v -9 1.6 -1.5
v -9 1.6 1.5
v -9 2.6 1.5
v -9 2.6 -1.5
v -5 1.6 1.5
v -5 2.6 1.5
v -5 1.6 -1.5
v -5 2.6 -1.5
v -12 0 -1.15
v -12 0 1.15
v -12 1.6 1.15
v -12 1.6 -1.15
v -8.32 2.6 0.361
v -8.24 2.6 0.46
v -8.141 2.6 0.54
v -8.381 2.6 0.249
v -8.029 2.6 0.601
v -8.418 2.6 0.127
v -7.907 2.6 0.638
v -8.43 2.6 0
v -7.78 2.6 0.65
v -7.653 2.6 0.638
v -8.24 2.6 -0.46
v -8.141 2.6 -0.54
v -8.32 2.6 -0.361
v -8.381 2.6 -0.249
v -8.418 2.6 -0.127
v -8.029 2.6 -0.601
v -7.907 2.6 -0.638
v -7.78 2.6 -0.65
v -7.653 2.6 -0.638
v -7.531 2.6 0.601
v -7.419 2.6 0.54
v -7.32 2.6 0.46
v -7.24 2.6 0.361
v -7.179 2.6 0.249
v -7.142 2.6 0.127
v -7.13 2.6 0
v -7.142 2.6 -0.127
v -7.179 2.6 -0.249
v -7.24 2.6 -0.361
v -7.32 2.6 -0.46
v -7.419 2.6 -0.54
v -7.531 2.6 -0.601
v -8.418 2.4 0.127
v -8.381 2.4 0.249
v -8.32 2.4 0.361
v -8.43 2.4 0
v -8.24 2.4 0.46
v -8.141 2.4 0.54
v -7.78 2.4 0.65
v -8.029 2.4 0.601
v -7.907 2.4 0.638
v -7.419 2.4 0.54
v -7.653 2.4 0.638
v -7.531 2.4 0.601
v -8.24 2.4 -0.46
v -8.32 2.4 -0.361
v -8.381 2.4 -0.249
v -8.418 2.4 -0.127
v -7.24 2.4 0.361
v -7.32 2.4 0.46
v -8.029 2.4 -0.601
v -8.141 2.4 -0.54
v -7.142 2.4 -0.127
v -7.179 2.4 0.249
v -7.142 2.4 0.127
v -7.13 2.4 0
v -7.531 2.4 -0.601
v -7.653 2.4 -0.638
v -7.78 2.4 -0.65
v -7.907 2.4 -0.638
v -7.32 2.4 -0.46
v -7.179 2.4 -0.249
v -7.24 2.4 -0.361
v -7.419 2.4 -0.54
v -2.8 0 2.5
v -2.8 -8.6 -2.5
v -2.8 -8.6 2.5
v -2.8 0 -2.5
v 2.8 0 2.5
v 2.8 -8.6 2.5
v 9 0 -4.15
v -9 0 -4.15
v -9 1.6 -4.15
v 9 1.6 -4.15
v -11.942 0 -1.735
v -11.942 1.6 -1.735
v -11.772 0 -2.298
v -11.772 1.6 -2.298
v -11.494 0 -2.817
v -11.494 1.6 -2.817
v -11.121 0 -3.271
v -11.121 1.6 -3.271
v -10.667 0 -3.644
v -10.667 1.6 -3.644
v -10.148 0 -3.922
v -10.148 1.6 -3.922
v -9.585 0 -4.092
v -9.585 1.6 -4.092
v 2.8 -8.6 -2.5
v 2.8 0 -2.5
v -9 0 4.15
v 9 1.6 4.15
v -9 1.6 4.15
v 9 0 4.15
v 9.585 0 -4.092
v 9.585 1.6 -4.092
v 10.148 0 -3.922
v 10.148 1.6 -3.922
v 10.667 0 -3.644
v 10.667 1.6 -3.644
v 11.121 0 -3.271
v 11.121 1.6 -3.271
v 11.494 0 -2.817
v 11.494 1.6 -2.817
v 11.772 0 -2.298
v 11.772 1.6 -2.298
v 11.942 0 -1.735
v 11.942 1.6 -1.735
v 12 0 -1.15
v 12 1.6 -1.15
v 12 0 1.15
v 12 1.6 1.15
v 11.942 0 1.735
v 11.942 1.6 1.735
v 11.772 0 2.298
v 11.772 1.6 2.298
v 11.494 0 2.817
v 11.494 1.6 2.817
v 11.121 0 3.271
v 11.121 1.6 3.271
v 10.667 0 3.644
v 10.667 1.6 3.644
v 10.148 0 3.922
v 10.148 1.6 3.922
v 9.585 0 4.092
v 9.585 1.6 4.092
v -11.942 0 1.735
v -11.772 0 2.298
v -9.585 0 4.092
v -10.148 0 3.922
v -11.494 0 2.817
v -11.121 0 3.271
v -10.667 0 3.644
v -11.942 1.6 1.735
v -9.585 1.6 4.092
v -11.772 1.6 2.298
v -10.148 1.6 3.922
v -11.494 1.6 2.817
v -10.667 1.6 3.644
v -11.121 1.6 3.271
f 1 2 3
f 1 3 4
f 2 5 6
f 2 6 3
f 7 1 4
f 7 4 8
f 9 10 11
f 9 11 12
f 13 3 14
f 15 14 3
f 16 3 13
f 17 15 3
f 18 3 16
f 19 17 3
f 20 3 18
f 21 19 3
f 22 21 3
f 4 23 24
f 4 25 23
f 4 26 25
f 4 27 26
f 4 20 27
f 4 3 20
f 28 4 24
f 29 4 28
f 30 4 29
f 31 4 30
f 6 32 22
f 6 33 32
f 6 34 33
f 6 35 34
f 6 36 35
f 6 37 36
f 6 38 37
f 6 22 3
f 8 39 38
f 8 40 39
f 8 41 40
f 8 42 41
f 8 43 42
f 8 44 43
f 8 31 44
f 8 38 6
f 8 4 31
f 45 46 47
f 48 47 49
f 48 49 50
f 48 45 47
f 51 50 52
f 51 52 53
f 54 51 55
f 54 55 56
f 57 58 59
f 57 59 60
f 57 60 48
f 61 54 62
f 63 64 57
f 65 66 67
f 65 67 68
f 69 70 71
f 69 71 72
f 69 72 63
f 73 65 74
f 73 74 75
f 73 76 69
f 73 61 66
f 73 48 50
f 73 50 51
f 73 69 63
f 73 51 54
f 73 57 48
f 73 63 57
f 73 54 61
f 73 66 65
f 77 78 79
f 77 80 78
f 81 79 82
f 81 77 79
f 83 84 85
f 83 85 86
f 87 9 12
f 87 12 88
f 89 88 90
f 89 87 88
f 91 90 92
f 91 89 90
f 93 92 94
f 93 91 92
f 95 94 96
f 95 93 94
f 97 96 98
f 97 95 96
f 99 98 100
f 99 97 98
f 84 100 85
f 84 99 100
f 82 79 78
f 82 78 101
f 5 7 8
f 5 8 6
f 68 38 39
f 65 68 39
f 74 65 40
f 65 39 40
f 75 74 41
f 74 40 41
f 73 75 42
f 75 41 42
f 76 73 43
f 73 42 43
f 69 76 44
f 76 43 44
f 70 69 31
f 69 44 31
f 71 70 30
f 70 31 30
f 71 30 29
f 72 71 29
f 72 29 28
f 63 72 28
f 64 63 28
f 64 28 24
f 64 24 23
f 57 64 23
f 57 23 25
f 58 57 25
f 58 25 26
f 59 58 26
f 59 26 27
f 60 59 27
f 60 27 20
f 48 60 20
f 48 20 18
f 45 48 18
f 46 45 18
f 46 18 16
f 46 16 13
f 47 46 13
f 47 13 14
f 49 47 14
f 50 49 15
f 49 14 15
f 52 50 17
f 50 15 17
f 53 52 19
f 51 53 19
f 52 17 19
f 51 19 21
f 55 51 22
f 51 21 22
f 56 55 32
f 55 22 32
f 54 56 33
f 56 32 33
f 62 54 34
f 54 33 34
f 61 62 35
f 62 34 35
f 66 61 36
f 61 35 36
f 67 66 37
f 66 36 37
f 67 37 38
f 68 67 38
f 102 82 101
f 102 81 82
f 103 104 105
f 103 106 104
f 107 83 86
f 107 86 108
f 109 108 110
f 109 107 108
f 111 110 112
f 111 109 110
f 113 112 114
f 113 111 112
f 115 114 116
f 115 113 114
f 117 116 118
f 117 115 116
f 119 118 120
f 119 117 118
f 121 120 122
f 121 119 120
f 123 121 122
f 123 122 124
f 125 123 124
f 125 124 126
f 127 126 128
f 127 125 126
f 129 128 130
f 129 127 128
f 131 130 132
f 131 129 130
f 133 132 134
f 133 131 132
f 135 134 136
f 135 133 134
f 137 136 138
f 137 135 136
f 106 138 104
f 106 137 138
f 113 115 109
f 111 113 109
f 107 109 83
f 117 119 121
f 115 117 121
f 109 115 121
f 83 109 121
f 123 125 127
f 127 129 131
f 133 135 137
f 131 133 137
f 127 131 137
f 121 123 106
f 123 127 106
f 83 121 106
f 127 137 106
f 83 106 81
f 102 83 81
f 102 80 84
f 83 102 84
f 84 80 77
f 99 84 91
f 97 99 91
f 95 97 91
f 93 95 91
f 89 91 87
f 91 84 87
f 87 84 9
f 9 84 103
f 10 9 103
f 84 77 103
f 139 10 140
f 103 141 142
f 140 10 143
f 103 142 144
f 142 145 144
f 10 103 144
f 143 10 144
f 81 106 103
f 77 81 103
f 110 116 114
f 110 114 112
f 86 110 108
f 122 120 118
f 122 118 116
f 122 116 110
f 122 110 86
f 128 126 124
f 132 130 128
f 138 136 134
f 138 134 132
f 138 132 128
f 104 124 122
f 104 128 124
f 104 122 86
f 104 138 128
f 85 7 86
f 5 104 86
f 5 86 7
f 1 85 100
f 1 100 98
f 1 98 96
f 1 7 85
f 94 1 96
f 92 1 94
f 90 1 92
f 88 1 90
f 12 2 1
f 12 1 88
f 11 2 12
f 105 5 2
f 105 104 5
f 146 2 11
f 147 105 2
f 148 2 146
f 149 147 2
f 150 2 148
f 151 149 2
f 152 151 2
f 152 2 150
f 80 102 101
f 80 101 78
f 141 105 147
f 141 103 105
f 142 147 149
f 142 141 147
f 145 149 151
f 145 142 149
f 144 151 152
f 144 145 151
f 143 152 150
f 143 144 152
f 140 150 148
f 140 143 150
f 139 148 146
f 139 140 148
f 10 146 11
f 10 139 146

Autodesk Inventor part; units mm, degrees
ref_plane "YZ Plane" through (0, 0, 0) normal (1, 0, 0) x (0, 1, 0)
ref_plane "XZ Plane" through (0, 0, 0) normal (0, 1, 0) x (-1, 0, 0)
ref_plane "XY Plane" through (0, 0, 0) normal (0, 0, 1) x (1, 0, 0)
sketch "Skizze1" plane through (0, 0, 0) normal (0, 1, 0) x (-1, 0, 0)
  line L0 (9, -4.15) -> (-9, -4.15)
  line L1 (-12, -1.15) -> (-12, 1.15)
  line L2 (-9, 4.15) -> (9, 4.15)
  line L3 (12, 1.15) -> (12, -1.15)
  line L4 (0, -12.6778) -> (0, 8.6418)
  line L5 (13.6706, 0) -> (-20.1804, 0)
  arc A0 (9, -4.15) -> (12, -1.15) centre (9, -1.15) ccw
  arc A1 (12, 1.15) -> (9, 4.15) centre (9, 1.15) ccw
  arc A2 (-9, 4.15) -> (-12, 1.15) centre (-9, 1.15) ccw
  arc A3 (-12, -1.15) -> (-9, -4.15) centre (-9, -1.15) ccw
  point P0 (0, 0)
  point P1 (12, -4.15)
  point P2 (-12, -4.15)
  dimension "d0" = 8.3
  dimension "d1" = 24
  dimension "d2" = 3
extrude "Extrusion1" add sketch "Skizze1" along normal blind 1.6
sketch "Skizze2" plane through (0, 0, 0) normal (0, -1, 0) x (1, 0, 0)
  line L0 (-2.8, 2.5) -> (2.8, 2.5)
  line L1 (2.8, 2.5) -> (2.8, -2.5)
  line L2 (2.8, -2.5) -> (-2.8, -2.5)
  line L3 (-2.8, -2.5) -> (-2.8, 2.5)
  line L4 (-9.3724, 0) -> (8.2101, 0)
  line L5 (0, 7.7773) -> (0, -6.9118)
  point P0 (0, 0)
  dimension "d5" = 5.6
  dimension "d6" = 5
extrude "Extrusion2" add sketch "Skizze2" along normal blind 8.6
sketch "Skizze3" plane through (0, 1.6, 0) normal (0, 1, 0) x (1, 0, 0)
  line L0 (-9, 1.5) -> (-5, 1.5)
  line L1 (-5, 1.5) -> (-5, -1.5)
  line L2 (-5, -1.5) -> (-9, -1.5)
  line L3 (-9, -1.5) -> (-9, 1.5)
  line L4 (-9.8398, 0) -> (1.393, 0)
  line L5 (-12, 1.15) -> (-12, -1.15) projected
  point P0 (0, 0)
  dimension "d9" = 3
  dimension "d10" = 4
  dimension "d11" = 3
extrude "Extrusion3" add sketch "Skizze3" along normal blind 1
sketch "Skizze4" plane through (0, 2.6, 0) normal (0, 1, 0) x (1, 0, 0)
  circle A0 centre (-7.78, 0) radius 0.65
  line L0 (-5, 1.5) -> (-9, 1.5) projected
  line L1 (-5, -1.5) -> (-5, 1.5) projected
  point P0 (0, 0)
  dimension "d14" = 1.3
  dimension "d15" = 1.5
  dimension "d16" = 2.78
extrude "Extrusion4" cut sketch "Skizze4" against normal blind 0.2
properties part number "Mikrofonboard"
